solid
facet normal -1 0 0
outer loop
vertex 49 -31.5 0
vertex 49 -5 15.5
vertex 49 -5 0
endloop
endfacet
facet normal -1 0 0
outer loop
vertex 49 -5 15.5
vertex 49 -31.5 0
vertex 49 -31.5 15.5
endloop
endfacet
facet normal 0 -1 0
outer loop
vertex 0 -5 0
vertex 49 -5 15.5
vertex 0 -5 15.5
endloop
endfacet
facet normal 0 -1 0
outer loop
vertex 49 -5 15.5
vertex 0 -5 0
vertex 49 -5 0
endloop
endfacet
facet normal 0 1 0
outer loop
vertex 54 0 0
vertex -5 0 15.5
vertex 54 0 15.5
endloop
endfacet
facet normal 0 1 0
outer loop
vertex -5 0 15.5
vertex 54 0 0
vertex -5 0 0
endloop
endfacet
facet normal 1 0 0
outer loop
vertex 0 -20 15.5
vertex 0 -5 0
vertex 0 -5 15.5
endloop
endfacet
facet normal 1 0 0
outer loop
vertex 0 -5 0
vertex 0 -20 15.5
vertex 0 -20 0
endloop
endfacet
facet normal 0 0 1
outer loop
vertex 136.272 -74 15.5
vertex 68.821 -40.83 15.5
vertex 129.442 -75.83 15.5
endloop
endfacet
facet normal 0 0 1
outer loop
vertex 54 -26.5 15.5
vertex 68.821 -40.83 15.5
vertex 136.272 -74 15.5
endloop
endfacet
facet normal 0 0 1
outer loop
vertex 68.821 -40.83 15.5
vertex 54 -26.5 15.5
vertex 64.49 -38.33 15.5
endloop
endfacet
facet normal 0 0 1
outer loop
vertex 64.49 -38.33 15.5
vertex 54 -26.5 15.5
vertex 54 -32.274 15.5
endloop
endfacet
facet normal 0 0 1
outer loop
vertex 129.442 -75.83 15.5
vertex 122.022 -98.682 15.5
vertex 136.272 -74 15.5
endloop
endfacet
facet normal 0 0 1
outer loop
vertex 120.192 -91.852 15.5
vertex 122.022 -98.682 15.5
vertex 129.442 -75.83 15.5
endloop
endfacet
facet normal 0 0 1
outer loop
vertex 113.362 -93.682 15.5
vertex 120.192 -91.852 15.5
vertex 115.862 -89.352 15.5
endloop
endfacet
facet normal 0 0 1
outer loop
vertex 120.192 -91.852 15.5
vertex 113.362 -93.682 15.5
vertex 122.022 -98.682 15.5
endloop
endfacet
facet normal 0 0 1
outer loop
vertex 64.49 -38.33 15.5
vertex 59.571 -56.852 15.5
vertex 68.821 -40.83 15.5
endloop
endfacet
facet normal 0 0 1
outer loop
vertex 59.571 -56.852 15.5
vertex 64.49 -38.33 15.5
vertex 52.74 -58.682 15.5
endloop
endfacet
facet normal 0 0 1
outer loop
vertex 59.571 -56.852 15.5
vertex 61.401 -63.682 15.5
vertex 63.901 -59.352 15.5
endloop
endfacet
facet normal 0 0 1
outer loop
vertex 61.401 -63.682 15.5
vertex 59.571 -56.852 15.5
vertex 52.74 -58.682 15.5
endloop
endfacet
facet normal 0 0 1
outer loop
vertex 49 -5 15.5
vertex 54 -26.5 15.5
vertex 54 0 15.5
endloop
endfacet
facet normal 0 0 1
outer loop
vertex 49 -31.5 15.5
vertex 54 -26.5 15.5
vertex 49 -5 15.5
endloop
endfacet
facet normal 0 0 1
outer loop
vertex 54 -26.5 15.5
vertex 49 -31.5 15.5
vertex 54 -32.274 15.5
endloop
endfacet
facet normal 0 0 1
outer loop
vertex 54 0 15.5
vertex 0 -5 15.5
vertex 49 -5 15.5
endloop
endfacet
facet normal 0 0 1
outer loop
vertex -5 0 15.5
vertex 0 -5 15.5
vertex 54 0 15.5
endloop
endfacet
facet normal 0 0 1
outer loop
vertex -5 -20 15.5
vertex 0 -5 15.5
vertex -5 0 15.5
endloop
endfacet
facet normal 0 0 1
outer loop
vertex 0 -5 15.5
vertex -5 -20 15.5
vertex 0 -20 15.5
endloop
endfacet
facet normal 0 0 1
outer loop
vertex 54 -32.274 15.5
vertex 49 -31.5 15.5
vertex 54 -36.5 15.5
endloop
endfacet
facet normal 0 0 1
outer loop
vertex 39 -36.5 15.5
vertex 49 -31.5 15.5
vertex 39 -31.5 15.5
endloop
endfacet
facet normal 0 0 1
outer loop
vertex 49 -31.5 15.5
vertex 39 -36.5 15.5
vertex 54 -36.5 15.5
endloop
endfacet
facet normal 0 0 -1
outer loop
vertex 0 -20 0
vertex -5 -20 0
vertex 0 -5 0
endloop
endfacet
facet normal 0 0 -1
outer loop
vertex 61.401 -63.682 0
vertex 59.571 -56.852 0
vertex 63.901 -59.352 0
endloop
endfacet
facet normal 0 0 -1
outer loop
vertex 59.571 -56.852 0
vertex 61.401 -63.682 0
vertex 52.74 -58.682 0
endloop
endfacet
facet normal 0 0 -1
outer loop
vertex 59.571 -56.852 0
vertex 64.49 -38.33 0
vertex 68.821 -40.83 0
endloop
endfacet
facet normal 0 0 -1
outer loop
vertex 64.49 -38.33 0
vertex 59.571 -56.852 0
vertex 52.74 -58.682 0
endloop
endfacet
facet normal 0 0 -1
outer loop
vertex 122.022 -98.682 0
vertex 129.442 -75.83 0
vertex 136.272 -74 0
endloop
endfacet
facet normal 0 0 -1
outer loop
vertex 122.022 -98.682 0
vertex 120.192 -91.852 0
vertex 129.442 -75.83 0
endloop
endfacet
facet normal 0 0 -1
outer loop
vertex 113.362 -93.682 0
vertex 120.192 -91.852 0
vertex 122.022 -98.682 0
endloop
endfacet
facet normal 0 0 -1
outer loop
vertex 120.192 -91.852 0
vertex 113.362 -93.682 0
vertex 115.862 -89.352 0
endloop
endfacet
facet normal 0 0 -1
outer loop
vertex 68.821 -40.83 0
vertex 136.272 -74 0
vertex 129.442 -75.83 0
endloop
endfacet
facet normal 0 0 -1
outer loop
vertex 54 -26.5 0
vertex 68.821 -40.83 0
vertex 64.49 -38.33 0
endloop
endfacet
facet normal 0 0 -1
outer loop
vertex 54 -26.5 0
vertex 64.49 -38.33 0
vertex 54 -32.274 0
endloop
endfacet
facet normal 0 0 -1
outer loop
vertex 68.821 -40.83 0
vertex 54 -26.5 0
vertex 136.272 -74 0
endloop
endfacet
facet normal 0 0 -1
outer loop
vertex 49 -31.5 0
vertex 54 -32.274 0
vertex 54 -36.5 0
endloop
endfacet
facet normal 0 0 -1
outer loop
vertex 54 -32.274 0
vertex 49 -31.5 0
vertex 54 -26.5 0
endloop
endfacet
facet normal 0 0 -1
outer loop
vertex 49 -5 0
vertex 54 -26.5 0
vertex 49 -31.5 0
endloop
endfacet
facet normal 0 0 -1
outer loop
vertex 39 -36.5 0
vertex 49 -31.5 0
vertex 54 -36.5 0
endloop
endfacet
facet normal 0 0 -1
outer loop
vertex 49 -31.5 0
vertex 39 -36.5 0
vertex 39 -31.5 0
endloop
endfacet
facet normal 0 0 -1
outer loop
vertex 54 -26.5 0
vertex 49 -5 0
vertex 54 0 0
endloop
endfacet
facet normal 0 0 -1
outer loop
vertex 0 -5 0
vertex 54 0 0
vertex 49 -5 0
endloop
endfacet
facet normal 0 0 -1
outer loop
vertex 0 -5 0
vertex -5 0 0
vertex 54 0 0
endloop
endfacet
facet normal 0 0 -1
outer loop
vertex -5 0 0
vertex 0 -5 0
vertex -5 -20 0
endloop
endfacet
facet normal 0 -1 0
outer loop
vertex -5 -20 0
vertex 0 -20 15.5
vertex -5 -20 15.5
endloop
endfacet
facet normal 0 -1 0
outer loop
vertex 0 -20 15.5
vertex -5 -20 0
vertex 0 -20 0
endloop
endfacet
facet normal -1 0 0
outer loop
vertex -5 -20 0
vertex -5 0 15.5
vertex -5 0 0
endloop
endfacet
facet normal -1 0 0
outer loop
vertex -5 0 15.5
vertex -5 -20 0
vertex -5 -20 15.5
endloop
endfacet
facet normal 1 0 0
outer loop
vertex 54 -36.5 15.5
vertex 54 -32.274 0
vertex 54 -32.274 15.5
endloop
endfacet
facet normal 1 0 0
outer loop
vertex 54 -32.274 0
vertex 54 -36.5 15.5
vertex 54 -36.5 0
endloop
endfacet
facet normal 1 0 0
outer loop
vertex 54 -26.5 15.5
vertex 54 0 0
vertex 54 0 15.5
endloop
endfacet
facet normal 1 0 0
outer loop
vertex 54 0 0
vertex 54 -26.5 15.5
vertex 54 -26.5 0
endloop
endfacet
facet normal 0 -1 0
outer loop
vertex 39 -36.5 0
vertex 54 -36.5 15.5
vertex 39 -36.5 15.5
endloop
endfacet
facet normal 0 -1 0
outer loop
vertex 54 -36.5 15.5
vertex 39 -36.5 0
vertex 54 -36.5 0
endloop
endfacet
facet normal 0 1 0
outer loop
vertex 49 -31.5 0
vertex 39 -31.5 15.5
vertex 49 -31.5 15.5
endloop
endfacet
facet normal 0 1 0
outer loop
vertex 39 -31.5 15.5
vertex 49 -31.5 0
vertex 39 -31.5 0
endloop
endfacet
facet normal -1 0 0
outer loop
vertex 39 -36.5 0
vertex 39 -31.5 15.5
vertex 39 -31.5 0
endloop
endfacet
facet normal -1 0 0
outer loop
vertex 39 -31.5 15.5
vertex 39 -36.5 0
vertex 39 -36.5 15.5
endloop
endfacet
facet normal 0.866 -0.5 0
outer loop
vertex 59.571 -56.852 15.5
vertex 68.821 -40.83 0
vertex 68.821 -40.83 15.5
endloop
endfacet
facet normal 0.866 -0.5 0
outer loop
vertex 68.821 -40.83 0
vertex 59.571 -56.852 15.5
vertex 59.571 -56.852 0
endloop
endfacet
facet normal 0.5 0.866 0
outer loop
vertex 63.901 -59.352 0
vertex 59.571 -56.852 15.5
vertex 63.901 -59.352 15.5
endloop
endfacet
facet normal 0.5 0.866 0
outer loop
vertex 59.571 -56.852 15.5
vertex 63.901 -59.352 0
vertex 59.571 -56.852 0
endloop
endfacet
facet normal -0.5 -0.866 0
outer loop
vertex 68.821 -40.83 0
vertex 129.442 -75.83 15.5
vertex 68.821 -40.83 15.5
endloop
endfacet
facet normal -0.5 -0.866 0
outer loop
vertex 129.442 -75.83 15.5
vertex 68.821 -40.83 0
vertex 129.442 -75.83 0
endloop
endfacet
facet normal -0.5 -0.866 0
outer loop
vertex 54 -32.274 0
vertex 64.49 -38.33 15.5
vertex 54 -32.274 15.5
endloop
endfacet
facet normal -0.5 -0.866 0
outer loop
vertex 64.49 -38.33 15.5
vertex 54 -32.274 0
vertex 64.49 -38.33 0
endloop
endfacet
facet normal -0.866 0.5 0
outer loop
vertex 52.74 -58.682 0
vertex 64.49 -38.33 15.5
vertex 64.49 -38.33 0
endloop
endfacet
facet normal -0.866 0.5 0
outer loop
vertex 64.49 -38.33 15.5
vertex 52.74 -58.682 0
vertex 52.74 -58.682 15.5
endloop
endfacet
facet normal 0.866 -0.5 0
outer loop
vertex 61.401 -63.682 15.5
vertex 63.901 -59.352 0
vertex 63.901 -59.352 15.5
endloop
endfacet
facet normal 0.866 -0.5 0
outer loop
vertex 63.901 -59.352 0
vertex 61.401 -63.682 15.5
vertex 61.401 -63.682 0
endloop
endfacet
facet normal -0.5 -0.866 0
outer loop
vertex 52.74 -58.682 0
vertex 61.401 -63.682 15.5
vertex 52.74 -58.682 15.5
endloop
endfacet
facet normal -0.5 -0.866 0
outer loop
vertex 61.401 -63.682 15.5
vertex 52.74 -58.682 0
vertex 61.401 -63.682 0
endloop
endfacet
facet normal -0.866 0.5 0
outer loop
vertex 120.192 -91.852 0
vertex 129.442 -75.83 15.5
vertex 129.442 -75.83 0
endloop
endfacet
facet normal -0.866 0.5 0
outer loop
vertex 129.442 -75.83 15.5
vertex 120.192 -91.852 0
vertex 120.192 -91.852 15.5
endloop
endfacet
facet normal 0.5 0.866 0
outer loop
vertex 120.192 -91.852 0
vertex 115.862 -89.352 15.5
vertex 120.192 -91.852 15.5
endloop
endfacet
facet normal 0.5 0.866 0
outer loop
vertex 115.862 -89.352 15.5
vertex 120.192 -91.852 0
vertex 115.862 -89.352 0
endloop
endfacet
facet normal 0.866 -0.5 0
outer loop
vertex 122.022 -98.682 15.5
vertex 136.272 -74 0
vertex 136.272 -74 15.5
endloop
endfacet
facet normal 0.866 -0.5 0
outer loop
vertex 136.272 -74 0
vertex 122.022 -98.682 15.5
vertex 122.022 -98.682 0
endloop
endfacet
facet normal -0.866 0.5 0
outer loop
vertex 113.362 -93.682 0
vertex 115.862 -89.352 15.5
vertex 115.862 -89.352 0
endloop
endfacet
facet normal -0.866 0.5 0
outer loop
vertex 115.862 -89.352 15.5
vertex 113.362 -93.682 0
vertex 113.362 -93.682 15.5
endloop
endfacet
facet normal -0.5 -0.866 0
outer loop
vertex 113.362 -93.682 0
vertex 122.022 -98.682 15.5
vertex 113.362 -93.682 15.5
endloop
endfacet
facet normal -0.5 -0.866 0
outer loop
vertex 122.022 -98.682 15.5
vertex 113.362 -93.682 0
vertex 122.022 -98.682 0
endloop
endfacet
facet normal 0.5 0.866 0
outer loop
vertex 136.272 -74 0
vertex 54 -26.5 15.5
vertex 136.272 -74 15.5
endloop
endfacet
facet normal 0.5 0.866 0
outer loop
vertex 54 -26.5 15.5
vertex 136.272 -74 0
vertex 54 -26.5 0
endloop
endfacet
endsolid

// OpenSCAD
// Simple Sixaxis Phone or Tablet Holder
// (c) 2013, Christopher "ScribbleJ" Jansen


/* [SixAxis] */

// Thickness of the entire clip
six_clip_thick = 5;
// Width of entire clip
six_clip_w = 15.5;

// Thickness of Sixaxis Controller
six_clip_d = 26.5;
// Depth of clip on front side
six_clip_db = 15;
// Length of Sixaxis Controller
six_clip_l  = 49;
// Length of clip on top of Sixaxis
six_t_overlap = 10;

/* [Phone] */

// How far we cover the front of the phone
phone_clip_overlap = 5;
// Thickness of the phone
phone_clip_d = 18.5;
// Length or Width of the phone
phone_clip_l = 70;
// Angle of Phone to Sixaxis
phone_clip_ang = 30;
// Phone clip distance from Sixaxis
phone_clip_extra = 20;
// Where to attach the phone clip on Sixaxis clip
phone_clip_attach = six_clip_d;

rotate([90,0,0])
{
  color("green") six();
  translate([six_clip_l+six_clip_thick,0,phone_clip_attach]) rotate([0,-phone_clip_ang,0]) phone();
}


module phone()
{
  cube([phone_clip_l + phone_clip_extra + six_clip_thick, six_clip_w, six_clip_thick]);
  translate([phone_clip_extra-six_clip_thick,0,six_clip_thick]) phone_arm();
  translate([phone_clip_extra + phone_clip_l + six_clip_thick,0,six_clip_thick]) mirror([1,0,0]) phone_arm();

}
module phone_arm()
{
  cube([six_clip_thick, six_clip_w, phone_clip_d]);
  translate([0,0,phone_clip_d]) cube([six_clip_thick + phone_clip_overlap, six_clip_w, six_clip_thick]);
}

module six()
{
      // underside
      cube([six_clip_l, six_clip_w, six_clip_thick]);    
      // front
      translate([-six_clip_thick,0,0]) cube([six_clip_thick, six_clip_w, six_clip_thick + six_clip_db]);
      // back of sixaxis
      translate([six_clip_l,0,0]) cube([six_clip_thick, six_clip_w, six_clip_thick *2  + six_clip_d]);
      // top of sixaxis
      translate([six_clip_l - six_t_overlap,0,six_clip_thick + six_clip_d]) cube([six_t_overlap, six_clip_w, six_clip_thick]);
}
